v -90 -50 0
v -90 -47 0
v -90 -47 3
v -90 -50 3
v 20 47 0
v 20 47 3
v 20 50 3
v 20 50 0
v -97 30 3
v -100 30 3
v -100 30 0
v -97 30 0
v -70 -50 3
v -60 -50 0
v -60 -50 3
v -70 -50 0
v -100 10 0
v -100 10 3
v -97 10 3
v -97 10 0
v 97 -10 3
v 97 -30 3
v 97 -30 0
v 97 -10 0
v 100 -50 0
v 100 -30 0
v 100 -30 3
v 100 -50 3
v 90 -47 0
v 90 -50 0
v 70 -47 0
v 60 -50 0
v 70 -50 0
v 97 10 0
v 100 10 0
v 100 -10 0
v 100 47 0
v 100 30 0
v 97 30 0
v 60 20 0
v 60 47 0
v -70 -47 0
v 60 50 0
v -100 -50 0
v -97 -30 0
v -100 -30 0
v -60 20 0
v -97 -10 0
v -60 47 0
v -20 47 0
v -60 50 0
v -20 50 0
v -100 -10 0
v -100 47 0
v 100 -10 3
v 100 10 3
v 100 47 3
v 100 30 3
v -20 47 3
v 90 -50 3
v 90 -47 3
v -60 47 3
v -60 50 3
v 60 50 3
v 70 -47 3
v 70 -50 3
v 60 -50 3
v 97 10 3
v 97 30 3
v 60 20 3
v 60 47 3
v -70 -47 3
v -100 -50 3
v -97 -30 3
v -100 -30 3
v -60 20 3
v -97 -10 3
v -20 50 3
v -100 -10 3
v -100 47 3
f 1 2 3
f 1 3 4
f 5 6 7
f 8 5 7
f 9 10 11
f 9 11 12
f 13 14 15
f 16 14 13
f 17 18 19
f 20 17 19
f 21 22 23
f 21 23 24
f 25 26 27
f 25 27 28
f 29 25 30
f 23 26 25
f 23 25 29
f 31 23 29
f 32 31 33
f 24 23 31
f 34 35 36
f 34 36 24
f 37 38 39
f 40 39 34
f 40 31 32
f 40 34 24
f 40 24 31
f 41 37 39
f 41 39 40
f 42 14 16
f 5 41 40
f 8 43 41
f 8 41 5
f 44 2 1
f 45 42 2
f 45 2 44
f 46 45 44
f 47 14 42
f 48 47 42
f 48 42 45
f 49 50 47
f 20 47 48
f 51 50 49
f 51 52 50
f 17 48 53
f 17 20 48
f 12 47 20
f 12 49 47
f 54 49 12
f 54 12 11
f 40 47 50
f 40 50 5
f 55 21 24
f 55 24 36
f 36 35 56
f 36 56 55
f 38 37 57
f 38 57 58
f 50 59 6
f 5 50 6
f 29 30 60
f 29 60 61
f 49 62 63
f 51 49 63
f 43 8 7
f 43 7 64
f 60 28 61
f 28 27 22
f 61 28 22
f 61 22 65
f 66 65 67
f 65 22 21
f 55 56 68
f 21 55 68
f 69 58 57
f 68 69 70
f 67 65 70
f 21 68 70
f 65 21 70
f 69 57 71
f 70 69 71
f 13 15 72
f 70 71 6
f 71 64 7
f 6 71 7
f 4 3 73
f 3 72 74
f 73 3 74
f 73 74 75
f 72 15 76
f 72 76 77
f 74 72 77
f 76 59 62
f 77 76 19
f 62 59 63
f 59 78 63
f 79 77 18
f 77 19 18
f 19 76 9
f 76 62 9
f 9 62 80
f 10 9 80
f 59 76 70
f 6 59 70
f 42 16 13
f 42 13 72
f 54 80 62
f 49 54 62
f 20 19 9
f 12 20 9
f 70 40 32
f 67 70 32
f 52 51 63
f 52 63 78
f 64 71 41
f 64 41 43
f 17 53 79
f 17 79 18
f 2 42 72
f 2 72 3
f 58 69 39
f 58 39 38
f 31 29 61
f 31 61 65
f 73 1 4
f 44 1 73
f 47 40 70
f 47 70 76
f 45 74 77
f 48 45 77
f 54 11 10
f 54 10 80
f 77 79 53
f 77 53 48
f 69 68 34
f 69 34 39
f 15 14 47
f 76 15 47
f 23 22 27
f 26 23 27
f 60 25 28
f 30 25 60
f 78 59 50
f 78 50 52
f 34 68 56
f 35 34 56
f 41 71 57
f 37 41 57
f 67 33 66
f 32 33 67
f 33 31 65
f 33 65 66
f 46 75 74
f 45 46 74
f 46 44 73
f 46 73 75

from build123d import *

# Parameters (mm, degrees)
BOSS_EXTRUDE1_DEPTH = 3
SKETCH2_W           = 3
SKETCH2_H           = 20
SKETCH2_W_2         = 40
SKETCH2_H_2         = 3
CUT_EXTRUDE1_DEPTH  = 3


with BuildPart() as part:
    # Sketch1 → Boss-Extrude1 (new body)
    with BuildSketch(Plane.XY):
        Polygon((-60, 5.09773753), (-60, -50), (-70, -50), (-70, -47), (-90, -47), (-90, -50), (-100, -50), (-100, 50), (100, 50), (100, -50), (90, -50), (90, -47), (70, -47), (70, -50), (60, -50), (60, -40.178411678), (60, 20), (-60, 20), align=None)
    extrude(amount=BOSS_EXTRUDE1_DEPTH)

    # Sketch2 → Cut-Extrude1 (cut)
    with BuildSketch(Plane.XY.offset(3)):
        with Locations((-98.5, -20)):
            Rectangle(SKETCH2_W, SKETCH2_H)
        with Locations((-98.5, 20)):
            Rectangle(SKETCH2_W, SKETCH2_H)
        with Locations((0, 48.5)):
            Rectangle(SKETCH2_W_2, SKETCH2_H_2)
        with Locations((80, 48.5)):
            Rectangle(SKETCH2_W_2, SKETCH2_H_2)
        with Locations((98.5, 20)):
            Rectangle(SKETCH2_W, SKETCH2_H)
        with Locations((98.5, -20)):
            Rectangle(SKETCH2_W, SKETCH2_H)
        with Locations((-80, 48.5)):
            Rectangle(SKETCH2_W_2, SKETCH2_H_2)
    extrude(amount=-CUT_EXTRUDE1_DEPTH, mode=Mode.SUBTRACT)


solid = part.part
